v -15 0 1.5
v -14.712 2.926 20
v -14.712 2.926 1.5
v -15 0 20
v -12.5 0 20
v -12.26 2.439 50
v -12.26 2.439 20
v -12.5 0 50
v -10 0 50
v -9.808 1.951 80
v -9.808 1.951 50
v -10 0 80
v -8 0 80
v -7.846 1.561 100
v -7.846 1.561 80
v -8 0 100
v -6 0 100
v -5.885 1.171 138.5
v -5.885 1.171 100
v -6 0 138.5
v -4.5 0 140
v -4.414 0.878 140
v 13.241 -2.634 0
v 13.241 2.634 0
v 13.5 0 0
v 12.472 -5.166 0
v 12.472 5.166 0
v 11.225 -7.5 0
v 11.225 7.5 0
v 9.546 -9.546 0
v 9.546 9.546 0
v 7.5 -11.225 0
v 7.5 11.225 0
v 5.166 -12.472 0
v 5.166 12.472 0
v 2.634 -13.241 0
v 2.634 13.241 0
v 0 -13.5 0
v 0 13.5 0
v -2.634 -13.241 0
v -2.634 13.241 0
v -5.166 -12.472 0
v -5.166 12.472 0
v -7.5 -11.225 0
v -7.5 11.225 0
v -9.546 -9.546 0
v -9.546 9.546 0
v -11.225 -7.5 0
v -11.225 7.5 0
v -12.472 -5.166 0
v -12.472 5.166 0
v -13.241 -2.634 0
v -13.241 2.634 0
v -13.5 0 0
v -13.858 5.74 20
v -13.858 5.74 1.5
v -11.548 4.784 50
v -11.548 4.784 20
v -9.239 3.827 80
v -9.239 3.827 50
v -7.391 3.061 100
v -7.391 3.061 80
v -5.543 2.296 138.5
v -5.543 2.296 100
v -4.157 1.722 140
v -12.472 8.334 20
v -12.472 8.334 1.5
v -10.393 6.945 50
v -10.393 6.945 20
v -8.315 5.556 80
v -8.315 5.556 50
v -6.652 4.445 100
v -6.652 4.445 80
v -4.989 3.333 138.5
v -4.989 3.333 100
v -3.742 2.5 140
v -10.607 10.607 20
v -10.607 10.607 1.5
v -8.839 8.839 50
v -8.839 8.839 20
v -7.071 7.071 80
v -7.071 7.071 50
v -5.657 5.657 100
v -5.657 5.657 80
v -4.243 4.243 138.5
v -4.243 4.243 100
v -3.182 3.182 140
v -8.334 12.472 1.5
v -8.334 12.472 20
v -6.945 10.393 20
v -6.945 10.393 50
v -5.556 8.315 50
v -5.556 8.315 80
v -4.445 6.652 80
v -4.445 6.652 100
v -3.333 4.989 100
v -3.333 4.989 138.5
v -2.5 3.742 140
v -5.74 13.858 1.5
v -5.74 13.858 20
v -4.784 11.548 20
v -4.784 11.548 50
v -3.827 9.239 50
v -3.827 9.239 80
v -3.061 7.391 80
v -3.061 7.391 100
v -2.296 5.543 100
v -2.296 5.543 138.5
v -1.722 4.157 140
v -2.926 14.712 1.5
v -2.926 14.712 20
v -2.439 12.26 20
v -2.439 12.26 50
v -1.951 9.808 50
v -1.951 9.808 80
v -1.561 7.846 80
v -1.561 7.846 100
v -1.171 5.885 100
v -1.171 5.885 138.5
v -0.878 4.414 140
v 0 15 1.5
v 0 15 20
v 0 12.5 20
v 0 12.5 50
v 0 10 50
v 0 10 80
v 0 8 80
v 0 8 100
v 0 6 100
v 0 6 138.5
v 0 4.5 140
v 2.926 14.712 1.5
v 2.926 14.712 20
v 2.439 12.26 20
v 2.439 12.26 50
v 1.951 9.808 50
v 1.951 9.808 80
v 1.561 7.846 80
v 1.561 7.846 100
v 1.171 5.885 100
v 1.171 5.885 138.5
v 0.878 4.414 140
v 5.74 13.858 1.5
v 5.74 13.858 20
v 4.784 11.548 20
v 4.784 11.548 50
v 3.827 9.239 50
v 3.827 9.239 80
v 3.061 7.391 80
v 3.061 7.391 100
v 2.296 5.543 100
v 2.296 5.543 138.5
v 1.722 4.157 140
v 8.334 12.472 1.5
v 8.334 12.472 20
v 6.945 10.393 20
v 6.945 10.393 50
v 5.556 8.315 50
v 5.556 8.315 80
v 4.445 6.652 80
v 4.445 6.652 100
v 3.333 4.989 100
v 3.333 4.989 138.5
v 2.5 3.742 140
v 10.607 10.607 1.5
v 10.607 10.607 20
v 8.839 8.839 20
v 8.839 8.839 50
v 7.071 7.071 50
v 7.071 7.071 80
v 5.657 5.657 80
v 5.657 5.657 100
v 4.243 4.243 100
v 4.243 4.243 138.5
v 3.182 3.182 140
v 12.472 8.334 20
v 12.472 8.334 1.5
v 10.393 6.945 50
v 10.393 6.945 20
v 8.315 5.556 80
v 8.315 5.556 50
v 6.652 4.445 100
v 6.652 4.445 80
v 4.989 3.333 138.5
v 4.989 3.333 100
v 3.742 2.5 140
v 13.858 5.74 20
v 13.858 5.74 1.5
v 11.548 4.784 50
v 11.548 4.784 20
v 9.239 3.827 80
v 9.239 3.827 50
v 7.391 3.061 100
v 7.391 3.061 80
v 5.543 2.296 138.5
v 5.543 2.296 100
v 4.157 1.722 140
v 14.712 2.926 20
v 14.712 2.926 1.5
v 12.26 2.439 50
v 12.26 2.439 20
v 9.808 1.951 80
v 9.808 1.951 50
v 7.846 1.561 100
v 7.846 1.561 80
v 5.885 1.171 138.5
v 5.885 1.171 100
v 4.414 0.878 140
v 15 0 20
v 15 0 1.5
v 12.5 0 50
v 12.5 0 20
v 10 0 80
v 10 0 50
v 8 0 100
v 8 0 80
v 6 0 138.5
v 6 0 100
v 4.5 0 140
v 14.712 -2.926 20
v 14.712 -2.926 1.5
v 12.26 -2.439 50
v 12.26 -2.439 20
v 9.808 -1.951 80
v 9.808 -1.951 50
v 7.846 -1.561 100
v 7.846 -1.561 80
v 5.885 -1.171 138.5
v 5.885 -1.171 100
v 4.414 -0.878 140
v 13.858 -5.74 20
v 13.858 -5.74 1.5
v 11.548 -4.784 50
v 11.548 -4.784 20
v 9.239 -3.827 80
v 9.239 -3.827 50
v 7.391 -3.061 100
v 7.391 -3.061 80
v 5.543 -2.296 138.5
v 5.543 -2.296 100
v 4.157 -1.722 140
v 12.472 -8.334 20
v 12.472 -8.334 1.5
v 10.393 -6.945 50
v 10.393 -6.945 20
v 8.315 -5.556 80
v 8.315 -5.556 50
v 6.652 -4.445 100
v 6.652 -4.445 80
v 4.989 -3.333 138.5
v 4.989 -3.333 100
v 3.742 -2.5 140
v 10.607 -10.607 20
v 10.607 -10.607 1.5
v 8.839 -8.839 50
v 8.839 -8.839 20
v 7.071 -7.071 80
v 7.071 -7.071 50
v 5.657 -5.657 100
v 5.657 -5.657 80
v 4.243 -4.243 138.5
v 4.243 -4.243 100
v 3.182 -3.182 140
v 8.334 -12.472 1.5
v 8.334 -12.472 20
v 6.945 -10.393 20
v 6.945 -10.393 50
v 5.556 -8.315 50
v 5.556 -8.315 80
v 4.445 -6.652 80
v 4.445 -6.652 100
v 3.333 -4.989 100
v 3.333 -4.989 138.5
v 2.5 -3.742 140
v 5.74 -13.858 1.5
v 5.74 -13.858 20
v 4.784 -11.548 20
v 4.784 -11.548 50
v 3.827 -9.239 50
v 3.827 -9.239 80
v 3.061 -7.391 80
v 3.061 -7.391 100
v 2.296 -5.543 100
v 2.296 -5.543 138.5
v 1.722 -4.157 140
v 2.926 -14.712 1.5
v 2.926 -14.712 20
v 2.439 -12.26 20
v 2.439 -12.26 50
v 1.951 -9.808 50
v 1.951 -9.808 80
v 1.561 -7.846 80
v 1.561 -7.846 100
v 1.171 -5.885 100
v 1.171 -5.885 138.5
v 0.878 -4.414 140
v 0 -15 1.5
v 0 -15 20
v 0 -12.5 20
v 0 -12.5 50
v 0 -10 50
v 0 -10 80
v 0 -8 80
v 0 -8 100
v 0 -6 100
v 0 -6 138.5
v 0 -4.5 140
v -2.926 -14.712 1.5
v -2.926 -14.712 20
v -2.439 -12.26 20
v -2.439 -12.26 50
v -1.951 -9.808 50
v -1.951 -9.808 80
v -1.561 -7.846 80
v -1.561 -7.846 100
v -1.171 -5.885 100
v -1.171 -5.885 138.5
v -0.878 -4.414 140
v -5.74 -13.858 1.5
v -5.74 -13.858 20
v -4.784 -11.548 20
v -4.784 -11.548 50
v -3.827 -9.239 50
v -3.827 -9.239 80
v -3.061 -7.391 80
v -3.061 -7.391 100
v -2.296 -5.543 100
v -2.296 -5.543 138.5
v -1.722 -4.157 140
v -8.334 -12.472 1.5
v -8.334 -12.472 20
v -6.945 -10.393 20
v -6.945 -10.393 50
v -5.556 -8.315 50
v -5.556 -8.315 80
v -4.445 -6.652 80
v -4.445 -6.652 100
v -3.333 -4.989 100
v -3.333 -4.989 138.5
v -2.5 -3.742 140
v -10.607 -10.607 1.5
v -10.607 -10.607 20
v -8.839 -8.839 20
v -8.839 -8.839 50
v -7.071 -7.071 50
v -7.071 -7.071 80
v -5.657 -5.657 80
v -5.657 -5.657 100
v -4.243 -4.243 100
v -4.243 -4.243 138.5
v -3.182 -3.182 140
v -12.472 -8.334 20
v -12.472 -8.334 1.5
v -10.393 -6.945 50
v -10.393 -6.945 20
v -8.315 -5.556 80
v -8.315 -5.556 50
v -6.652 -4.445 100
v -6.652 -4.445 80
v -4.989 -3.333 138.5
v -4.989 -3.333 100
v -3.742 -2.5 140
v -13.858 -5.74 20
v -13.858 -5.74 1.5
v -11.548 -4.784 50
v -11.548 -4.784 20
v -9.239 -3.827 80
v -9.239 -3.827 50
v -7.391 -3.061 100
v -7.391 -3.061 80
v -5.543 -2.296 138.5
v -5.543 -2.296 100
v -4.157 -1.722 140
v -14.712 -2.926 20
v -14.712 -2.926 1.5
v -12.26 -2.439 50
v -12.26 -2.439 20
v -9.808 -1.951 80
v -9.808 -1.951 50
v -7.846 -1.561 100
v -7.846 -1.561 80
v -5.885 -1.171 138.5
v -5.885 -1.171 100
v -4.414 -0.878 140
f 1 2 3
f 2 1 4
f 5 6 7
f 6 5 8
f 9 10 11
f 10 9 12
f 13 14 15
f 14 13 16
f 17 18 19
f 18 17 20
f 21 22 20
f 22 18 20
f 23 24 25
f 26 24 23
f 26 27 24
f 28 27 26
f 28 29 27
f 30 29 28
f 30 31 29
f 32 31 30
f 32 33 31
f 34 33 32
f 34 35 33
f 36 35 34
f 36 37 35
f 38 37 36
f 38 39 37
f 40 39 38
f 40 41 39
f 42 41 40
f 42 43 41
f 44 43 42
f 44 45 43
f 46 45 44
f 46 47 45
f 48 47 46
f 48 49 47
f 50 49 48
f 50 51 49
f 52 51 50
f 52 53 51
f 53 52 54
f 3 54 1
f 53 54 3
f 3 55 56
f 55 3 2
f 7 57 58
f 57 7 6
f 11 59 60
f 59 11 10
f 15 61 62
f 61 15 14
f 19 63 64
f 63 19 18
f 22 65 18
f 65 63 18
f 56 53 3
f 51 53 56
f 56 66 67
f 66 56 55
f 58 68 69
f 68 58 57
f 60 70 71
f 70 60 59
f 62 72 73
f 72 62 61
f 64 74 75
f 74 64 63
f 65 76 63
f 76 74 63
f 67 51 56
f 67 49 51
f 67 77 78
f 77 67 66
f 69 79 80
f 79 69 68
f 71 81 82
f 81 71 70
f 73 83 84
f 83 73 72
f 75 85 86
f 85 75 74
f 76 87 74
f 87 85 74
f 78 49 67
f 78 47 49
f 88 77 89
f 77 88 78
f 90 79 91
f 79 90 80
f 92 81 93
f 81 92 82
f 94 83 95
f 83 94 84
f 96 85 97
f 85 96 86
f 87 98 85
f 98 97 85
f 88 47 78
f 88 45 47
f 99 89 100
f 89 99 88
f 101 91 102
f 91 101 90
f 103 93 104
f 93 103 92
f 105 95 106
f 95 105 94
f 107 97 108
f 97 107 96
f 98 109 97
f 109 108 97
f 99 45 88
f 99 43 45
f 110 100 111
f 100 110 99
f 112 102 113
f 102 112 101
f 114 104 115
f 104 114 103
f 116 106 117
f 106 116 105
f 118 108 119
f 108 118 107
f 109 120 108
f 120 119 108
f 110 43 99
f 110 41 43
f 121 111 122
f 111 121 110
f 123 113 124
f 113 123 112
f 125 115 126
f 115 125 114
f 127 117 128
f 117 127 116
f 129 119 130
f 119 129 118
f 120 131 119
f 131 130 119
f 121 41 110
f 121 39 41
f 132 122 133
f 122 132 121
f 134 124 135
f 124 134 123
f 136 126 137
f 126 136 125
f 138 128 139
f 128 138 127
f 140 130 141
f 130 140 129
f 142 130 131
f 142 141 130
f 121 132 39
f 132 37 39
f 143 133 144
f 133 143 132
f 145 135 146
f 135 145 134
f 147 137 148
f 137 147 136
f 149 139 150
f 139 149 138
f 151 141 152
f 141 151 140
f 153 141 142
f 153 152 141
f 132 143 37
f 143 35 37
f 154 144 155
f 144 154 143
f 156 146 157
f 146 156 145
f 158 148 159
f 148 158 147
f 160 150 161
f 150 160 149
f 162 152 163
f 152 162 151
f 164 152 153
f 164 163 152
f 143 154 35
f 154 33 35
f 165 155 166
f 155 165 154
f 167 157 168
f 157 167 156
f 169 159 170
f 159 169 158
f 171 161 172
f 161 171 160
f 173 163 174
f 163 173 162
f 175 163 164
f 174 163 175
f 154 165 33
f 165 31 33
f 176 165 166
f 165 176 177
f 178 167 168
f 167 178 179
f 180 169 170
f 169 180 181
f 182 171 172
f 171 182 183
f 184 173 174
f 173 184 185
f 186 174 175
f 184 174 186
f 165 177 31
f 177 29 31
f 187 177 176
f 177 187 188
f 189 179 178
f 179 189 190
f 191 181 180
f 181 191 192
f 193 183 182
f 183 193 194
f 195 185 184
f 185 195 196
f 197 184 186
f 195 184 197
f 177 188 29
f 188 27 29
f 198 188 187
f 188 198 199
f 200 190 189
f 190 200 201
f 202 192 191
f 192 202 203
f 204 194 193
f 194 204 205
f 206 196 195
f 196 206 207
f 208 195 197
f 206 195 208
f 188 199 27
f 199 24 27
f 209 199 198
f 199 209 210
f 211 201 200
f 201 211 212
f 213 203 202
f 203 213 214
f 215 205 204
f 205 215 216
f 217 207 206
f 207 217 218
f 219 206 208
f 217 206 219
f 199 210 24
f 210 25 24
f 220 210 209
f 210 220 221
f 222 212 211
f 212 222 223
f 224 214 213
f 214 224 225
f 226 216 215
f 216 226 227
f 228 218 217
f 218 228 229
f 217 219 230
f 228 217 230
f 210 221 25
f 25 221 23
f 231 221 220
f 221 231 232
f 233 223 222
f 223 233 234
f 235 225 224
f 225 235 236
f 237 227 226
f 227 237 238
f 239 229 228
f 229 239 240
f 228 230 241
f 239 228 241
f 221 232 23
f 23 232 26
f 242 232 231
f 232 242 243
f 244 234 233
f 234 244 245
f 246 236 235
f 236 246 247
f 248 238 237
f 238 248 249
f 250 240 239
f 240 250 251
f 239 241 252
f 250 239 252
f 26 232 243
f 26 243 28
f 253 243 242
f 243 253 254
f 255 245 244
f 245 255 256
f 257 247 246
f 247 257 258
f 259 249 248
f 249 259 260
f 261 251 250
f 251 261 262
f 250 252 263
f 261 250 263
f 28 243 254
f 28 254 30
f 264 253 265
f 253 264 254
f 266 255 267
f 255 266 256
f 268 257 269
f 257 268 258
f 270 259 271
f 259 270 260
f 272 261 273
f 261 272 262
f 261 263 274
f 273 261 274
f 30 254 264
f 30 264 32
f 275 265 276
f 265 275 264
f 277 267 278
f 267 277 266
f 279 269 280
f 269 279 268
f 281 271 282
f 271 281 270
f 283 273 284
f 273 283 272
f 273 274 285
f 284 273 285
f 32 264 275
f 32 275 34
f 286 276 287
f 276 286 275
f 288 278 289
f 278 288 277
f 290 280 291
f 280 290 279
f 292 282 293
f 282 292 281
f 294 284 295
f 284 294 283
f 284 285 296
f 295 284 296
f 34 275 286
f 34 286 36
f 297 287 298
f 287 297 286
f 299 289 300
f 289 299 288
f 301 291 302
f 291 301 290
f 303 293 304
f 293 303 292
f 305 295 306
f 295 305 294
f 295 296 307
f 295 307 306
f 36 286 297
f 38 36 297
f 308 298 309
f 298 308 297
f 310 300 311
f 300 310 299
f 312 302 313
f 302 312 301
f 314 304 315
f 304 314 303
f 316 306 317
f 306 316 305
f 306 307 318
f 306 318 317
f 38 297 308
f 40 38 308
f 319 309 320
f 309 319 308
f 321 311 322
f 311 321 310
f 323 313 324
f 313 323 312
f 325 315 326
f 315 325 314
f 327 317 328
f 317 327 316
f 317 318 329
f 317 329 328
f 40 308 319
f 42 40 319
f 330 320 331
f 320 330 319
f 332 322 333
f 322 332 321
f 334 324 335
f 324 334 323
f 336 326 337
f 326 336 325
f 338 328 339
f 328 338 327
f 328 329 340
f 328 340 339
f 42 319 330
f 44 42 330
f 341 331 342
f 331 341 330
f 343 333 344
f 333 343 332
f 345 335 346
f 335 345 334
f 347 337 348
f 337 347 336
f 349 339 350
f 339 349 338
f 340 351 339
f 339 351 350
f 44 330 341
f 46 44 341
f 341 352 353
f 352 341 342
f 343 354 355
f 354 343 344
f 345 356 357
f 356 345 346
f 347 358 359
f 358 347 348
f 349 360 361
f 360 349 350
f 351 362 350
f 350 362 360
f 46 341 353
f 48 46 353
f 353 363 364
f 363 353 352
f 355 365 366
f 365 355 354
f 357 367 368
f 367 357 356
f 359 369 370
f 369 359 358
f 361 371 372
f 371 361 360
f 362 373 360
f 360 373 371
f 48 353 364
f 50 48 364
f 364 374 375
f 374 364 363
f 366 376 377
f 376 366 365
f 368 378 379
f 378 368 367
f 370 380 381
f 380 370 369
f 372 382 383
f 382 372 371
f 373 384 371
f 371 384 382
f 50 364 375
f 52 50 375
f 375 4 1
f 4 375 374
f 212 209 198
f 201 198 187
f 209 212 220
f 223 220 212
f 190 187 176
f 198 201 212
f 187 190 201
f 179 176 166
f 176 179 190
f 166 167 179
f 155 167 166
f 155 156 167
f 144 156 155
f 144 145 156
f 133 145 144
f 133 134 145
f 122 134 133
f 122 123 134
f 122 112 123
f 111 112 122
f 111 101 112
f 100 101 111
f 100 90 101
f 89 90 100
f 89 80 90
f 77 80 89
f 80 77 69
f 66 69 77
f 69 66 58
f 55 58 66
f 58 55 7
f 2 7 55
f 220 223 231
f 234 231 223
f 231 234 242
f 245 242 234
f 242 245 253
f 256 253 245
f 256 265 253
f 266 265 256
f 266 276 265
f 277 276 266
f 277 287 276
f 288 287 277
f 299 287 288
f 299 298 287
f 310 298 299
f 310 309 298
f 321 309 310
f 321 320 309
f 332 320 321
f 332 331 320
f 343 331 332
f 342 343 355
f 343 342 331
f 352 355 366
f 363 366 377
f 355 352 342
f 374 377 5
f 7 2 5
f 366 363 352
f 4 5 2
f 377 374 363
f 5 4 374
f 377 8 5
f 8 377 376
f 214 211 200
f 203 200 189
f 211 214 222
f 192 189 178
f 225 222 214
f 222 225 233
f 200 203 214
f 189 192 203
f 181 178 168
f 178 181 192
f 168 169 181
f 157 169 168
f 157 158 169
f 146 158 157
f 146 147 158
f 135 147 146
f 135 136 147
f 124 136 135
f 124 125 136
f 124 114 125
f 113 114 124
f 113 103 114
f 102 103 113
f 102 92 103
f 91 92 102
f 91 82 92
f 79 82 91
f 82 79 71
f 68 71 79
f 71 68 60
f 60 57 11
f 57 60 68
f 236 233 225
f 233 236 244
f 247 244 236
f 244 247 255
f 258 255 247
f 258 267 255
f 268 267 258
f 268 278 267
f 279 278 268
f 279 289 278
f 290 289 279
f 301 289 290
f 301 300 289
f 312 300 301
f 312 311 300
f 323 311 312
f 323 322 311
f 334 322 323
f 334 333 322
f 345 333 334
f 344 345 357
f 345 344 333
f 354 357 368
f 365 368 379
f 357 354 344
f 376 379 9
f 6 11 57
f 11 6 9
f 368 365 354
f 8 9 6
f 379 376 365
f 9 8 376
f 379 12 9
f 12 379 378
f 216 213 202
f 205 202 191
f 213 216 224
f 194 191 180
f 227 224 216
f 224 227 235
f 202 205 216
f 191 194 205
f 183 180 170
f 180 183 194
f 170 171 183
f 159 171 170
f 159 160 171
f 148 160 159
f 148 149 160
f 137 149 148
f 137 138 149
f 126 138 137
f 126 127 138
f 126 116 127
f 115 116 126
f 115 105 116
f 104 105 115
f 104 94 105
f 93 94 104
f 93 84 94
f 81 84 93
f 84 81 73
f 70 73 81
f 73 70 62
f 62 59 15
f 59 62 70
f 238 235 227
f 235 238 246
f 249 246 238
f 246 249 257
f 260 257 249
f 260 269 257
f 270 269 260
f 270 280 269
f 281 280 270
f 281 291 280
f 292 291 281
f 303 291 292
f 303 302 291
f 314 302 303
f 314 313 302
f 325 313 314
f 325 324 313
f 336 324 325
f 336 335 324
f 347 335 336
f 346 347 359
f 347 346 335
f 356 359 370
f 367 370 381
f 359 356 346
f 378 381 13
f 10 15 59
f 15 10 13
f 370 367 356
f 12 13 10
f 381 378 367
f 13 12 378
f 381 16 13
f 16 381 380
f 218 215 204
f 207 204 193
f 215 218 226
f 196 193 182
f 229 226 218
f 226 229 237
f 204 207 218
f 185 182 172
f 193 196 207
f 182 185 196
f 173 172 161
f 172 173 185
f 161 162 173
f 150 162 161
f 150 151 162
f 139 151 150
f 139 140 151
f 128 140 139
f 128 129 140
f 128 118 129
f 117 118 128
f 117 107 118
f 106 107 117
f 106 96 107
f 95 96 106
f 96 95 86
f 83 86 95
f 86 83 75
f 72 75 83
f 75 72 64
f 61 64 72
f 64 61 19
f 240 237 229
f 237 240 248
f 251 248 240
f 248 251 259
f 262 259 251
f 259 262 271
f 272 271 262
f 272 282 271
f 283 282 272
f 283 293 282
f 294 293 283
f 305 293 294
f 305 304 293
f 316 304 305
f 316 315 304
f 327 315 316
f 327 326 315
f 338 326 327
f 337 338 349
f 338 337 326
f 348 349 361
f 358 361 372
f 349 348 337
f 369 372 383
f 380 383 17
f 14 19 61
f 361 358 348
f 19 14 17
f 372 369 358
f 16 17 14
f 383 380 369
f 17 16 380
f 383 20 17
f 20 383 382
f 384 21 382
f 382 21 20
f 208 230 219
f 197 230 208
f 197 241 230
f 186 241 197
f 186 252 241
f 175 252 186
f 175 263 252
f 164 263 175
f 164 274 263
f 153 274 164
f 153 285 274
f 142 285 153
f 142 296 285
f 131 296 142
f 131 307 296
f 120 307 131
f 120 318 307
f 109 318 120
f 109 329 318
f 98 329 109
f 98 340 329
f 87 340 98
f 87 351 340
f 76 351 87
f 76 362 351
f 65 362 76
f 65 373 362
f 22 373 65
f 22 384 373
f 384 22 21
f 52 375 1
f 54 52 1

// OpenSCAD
$fn = 32;

// ----------------------------------------------------------------------
// Stepped shaft: diameters 30, 25, 20, 16, 12 mm, 140 mm long
// ----------------------------------------------------------------------

// --- parameters (mm) ---
d1 = 30;                  // step 1 diameter
len1 = 20;                // step 1 length
d2 = 25;                  // step 2 diameter
len2 = 30;                // step 2 length
d3 = 20;                  // step 3 diameter
len3 = 30;                // step 3 length
d4 = 16;                  // step 4 diameter
len4 = 20;                // step 4 length
d5 = 12;                  // step 5 diameter
len5 = 40;                // step 5 length
total = 140;              // overall length
chamfer = 1.5;            // end chamfer
key_w = 4;                // keyway width
key_d = 2;                // keyway depth
key_len = 14;             // keyway length
key_z = 123;              // keyway start along the shaft

/* closed turning profile: x is the radius, y is the length */
profile = [[0, 0], [15 - chamfer, 0], [15, chamfer], [15, 20], [12.5, 20], [12.5, 50], [10, 50], [10, 80], [8, 80], [8, 100], [6, 100], [6, 138.5], [4.5, 140], [0, 140]];

difference() {
  rotate_extrude() polygon(profile);
  /* keyway milled into the top of the largest step */
  translate([d1 / 2 - key_d, -key_w / 2, key_z]) cube([key_d + 1, key_w, key_len]);
}
